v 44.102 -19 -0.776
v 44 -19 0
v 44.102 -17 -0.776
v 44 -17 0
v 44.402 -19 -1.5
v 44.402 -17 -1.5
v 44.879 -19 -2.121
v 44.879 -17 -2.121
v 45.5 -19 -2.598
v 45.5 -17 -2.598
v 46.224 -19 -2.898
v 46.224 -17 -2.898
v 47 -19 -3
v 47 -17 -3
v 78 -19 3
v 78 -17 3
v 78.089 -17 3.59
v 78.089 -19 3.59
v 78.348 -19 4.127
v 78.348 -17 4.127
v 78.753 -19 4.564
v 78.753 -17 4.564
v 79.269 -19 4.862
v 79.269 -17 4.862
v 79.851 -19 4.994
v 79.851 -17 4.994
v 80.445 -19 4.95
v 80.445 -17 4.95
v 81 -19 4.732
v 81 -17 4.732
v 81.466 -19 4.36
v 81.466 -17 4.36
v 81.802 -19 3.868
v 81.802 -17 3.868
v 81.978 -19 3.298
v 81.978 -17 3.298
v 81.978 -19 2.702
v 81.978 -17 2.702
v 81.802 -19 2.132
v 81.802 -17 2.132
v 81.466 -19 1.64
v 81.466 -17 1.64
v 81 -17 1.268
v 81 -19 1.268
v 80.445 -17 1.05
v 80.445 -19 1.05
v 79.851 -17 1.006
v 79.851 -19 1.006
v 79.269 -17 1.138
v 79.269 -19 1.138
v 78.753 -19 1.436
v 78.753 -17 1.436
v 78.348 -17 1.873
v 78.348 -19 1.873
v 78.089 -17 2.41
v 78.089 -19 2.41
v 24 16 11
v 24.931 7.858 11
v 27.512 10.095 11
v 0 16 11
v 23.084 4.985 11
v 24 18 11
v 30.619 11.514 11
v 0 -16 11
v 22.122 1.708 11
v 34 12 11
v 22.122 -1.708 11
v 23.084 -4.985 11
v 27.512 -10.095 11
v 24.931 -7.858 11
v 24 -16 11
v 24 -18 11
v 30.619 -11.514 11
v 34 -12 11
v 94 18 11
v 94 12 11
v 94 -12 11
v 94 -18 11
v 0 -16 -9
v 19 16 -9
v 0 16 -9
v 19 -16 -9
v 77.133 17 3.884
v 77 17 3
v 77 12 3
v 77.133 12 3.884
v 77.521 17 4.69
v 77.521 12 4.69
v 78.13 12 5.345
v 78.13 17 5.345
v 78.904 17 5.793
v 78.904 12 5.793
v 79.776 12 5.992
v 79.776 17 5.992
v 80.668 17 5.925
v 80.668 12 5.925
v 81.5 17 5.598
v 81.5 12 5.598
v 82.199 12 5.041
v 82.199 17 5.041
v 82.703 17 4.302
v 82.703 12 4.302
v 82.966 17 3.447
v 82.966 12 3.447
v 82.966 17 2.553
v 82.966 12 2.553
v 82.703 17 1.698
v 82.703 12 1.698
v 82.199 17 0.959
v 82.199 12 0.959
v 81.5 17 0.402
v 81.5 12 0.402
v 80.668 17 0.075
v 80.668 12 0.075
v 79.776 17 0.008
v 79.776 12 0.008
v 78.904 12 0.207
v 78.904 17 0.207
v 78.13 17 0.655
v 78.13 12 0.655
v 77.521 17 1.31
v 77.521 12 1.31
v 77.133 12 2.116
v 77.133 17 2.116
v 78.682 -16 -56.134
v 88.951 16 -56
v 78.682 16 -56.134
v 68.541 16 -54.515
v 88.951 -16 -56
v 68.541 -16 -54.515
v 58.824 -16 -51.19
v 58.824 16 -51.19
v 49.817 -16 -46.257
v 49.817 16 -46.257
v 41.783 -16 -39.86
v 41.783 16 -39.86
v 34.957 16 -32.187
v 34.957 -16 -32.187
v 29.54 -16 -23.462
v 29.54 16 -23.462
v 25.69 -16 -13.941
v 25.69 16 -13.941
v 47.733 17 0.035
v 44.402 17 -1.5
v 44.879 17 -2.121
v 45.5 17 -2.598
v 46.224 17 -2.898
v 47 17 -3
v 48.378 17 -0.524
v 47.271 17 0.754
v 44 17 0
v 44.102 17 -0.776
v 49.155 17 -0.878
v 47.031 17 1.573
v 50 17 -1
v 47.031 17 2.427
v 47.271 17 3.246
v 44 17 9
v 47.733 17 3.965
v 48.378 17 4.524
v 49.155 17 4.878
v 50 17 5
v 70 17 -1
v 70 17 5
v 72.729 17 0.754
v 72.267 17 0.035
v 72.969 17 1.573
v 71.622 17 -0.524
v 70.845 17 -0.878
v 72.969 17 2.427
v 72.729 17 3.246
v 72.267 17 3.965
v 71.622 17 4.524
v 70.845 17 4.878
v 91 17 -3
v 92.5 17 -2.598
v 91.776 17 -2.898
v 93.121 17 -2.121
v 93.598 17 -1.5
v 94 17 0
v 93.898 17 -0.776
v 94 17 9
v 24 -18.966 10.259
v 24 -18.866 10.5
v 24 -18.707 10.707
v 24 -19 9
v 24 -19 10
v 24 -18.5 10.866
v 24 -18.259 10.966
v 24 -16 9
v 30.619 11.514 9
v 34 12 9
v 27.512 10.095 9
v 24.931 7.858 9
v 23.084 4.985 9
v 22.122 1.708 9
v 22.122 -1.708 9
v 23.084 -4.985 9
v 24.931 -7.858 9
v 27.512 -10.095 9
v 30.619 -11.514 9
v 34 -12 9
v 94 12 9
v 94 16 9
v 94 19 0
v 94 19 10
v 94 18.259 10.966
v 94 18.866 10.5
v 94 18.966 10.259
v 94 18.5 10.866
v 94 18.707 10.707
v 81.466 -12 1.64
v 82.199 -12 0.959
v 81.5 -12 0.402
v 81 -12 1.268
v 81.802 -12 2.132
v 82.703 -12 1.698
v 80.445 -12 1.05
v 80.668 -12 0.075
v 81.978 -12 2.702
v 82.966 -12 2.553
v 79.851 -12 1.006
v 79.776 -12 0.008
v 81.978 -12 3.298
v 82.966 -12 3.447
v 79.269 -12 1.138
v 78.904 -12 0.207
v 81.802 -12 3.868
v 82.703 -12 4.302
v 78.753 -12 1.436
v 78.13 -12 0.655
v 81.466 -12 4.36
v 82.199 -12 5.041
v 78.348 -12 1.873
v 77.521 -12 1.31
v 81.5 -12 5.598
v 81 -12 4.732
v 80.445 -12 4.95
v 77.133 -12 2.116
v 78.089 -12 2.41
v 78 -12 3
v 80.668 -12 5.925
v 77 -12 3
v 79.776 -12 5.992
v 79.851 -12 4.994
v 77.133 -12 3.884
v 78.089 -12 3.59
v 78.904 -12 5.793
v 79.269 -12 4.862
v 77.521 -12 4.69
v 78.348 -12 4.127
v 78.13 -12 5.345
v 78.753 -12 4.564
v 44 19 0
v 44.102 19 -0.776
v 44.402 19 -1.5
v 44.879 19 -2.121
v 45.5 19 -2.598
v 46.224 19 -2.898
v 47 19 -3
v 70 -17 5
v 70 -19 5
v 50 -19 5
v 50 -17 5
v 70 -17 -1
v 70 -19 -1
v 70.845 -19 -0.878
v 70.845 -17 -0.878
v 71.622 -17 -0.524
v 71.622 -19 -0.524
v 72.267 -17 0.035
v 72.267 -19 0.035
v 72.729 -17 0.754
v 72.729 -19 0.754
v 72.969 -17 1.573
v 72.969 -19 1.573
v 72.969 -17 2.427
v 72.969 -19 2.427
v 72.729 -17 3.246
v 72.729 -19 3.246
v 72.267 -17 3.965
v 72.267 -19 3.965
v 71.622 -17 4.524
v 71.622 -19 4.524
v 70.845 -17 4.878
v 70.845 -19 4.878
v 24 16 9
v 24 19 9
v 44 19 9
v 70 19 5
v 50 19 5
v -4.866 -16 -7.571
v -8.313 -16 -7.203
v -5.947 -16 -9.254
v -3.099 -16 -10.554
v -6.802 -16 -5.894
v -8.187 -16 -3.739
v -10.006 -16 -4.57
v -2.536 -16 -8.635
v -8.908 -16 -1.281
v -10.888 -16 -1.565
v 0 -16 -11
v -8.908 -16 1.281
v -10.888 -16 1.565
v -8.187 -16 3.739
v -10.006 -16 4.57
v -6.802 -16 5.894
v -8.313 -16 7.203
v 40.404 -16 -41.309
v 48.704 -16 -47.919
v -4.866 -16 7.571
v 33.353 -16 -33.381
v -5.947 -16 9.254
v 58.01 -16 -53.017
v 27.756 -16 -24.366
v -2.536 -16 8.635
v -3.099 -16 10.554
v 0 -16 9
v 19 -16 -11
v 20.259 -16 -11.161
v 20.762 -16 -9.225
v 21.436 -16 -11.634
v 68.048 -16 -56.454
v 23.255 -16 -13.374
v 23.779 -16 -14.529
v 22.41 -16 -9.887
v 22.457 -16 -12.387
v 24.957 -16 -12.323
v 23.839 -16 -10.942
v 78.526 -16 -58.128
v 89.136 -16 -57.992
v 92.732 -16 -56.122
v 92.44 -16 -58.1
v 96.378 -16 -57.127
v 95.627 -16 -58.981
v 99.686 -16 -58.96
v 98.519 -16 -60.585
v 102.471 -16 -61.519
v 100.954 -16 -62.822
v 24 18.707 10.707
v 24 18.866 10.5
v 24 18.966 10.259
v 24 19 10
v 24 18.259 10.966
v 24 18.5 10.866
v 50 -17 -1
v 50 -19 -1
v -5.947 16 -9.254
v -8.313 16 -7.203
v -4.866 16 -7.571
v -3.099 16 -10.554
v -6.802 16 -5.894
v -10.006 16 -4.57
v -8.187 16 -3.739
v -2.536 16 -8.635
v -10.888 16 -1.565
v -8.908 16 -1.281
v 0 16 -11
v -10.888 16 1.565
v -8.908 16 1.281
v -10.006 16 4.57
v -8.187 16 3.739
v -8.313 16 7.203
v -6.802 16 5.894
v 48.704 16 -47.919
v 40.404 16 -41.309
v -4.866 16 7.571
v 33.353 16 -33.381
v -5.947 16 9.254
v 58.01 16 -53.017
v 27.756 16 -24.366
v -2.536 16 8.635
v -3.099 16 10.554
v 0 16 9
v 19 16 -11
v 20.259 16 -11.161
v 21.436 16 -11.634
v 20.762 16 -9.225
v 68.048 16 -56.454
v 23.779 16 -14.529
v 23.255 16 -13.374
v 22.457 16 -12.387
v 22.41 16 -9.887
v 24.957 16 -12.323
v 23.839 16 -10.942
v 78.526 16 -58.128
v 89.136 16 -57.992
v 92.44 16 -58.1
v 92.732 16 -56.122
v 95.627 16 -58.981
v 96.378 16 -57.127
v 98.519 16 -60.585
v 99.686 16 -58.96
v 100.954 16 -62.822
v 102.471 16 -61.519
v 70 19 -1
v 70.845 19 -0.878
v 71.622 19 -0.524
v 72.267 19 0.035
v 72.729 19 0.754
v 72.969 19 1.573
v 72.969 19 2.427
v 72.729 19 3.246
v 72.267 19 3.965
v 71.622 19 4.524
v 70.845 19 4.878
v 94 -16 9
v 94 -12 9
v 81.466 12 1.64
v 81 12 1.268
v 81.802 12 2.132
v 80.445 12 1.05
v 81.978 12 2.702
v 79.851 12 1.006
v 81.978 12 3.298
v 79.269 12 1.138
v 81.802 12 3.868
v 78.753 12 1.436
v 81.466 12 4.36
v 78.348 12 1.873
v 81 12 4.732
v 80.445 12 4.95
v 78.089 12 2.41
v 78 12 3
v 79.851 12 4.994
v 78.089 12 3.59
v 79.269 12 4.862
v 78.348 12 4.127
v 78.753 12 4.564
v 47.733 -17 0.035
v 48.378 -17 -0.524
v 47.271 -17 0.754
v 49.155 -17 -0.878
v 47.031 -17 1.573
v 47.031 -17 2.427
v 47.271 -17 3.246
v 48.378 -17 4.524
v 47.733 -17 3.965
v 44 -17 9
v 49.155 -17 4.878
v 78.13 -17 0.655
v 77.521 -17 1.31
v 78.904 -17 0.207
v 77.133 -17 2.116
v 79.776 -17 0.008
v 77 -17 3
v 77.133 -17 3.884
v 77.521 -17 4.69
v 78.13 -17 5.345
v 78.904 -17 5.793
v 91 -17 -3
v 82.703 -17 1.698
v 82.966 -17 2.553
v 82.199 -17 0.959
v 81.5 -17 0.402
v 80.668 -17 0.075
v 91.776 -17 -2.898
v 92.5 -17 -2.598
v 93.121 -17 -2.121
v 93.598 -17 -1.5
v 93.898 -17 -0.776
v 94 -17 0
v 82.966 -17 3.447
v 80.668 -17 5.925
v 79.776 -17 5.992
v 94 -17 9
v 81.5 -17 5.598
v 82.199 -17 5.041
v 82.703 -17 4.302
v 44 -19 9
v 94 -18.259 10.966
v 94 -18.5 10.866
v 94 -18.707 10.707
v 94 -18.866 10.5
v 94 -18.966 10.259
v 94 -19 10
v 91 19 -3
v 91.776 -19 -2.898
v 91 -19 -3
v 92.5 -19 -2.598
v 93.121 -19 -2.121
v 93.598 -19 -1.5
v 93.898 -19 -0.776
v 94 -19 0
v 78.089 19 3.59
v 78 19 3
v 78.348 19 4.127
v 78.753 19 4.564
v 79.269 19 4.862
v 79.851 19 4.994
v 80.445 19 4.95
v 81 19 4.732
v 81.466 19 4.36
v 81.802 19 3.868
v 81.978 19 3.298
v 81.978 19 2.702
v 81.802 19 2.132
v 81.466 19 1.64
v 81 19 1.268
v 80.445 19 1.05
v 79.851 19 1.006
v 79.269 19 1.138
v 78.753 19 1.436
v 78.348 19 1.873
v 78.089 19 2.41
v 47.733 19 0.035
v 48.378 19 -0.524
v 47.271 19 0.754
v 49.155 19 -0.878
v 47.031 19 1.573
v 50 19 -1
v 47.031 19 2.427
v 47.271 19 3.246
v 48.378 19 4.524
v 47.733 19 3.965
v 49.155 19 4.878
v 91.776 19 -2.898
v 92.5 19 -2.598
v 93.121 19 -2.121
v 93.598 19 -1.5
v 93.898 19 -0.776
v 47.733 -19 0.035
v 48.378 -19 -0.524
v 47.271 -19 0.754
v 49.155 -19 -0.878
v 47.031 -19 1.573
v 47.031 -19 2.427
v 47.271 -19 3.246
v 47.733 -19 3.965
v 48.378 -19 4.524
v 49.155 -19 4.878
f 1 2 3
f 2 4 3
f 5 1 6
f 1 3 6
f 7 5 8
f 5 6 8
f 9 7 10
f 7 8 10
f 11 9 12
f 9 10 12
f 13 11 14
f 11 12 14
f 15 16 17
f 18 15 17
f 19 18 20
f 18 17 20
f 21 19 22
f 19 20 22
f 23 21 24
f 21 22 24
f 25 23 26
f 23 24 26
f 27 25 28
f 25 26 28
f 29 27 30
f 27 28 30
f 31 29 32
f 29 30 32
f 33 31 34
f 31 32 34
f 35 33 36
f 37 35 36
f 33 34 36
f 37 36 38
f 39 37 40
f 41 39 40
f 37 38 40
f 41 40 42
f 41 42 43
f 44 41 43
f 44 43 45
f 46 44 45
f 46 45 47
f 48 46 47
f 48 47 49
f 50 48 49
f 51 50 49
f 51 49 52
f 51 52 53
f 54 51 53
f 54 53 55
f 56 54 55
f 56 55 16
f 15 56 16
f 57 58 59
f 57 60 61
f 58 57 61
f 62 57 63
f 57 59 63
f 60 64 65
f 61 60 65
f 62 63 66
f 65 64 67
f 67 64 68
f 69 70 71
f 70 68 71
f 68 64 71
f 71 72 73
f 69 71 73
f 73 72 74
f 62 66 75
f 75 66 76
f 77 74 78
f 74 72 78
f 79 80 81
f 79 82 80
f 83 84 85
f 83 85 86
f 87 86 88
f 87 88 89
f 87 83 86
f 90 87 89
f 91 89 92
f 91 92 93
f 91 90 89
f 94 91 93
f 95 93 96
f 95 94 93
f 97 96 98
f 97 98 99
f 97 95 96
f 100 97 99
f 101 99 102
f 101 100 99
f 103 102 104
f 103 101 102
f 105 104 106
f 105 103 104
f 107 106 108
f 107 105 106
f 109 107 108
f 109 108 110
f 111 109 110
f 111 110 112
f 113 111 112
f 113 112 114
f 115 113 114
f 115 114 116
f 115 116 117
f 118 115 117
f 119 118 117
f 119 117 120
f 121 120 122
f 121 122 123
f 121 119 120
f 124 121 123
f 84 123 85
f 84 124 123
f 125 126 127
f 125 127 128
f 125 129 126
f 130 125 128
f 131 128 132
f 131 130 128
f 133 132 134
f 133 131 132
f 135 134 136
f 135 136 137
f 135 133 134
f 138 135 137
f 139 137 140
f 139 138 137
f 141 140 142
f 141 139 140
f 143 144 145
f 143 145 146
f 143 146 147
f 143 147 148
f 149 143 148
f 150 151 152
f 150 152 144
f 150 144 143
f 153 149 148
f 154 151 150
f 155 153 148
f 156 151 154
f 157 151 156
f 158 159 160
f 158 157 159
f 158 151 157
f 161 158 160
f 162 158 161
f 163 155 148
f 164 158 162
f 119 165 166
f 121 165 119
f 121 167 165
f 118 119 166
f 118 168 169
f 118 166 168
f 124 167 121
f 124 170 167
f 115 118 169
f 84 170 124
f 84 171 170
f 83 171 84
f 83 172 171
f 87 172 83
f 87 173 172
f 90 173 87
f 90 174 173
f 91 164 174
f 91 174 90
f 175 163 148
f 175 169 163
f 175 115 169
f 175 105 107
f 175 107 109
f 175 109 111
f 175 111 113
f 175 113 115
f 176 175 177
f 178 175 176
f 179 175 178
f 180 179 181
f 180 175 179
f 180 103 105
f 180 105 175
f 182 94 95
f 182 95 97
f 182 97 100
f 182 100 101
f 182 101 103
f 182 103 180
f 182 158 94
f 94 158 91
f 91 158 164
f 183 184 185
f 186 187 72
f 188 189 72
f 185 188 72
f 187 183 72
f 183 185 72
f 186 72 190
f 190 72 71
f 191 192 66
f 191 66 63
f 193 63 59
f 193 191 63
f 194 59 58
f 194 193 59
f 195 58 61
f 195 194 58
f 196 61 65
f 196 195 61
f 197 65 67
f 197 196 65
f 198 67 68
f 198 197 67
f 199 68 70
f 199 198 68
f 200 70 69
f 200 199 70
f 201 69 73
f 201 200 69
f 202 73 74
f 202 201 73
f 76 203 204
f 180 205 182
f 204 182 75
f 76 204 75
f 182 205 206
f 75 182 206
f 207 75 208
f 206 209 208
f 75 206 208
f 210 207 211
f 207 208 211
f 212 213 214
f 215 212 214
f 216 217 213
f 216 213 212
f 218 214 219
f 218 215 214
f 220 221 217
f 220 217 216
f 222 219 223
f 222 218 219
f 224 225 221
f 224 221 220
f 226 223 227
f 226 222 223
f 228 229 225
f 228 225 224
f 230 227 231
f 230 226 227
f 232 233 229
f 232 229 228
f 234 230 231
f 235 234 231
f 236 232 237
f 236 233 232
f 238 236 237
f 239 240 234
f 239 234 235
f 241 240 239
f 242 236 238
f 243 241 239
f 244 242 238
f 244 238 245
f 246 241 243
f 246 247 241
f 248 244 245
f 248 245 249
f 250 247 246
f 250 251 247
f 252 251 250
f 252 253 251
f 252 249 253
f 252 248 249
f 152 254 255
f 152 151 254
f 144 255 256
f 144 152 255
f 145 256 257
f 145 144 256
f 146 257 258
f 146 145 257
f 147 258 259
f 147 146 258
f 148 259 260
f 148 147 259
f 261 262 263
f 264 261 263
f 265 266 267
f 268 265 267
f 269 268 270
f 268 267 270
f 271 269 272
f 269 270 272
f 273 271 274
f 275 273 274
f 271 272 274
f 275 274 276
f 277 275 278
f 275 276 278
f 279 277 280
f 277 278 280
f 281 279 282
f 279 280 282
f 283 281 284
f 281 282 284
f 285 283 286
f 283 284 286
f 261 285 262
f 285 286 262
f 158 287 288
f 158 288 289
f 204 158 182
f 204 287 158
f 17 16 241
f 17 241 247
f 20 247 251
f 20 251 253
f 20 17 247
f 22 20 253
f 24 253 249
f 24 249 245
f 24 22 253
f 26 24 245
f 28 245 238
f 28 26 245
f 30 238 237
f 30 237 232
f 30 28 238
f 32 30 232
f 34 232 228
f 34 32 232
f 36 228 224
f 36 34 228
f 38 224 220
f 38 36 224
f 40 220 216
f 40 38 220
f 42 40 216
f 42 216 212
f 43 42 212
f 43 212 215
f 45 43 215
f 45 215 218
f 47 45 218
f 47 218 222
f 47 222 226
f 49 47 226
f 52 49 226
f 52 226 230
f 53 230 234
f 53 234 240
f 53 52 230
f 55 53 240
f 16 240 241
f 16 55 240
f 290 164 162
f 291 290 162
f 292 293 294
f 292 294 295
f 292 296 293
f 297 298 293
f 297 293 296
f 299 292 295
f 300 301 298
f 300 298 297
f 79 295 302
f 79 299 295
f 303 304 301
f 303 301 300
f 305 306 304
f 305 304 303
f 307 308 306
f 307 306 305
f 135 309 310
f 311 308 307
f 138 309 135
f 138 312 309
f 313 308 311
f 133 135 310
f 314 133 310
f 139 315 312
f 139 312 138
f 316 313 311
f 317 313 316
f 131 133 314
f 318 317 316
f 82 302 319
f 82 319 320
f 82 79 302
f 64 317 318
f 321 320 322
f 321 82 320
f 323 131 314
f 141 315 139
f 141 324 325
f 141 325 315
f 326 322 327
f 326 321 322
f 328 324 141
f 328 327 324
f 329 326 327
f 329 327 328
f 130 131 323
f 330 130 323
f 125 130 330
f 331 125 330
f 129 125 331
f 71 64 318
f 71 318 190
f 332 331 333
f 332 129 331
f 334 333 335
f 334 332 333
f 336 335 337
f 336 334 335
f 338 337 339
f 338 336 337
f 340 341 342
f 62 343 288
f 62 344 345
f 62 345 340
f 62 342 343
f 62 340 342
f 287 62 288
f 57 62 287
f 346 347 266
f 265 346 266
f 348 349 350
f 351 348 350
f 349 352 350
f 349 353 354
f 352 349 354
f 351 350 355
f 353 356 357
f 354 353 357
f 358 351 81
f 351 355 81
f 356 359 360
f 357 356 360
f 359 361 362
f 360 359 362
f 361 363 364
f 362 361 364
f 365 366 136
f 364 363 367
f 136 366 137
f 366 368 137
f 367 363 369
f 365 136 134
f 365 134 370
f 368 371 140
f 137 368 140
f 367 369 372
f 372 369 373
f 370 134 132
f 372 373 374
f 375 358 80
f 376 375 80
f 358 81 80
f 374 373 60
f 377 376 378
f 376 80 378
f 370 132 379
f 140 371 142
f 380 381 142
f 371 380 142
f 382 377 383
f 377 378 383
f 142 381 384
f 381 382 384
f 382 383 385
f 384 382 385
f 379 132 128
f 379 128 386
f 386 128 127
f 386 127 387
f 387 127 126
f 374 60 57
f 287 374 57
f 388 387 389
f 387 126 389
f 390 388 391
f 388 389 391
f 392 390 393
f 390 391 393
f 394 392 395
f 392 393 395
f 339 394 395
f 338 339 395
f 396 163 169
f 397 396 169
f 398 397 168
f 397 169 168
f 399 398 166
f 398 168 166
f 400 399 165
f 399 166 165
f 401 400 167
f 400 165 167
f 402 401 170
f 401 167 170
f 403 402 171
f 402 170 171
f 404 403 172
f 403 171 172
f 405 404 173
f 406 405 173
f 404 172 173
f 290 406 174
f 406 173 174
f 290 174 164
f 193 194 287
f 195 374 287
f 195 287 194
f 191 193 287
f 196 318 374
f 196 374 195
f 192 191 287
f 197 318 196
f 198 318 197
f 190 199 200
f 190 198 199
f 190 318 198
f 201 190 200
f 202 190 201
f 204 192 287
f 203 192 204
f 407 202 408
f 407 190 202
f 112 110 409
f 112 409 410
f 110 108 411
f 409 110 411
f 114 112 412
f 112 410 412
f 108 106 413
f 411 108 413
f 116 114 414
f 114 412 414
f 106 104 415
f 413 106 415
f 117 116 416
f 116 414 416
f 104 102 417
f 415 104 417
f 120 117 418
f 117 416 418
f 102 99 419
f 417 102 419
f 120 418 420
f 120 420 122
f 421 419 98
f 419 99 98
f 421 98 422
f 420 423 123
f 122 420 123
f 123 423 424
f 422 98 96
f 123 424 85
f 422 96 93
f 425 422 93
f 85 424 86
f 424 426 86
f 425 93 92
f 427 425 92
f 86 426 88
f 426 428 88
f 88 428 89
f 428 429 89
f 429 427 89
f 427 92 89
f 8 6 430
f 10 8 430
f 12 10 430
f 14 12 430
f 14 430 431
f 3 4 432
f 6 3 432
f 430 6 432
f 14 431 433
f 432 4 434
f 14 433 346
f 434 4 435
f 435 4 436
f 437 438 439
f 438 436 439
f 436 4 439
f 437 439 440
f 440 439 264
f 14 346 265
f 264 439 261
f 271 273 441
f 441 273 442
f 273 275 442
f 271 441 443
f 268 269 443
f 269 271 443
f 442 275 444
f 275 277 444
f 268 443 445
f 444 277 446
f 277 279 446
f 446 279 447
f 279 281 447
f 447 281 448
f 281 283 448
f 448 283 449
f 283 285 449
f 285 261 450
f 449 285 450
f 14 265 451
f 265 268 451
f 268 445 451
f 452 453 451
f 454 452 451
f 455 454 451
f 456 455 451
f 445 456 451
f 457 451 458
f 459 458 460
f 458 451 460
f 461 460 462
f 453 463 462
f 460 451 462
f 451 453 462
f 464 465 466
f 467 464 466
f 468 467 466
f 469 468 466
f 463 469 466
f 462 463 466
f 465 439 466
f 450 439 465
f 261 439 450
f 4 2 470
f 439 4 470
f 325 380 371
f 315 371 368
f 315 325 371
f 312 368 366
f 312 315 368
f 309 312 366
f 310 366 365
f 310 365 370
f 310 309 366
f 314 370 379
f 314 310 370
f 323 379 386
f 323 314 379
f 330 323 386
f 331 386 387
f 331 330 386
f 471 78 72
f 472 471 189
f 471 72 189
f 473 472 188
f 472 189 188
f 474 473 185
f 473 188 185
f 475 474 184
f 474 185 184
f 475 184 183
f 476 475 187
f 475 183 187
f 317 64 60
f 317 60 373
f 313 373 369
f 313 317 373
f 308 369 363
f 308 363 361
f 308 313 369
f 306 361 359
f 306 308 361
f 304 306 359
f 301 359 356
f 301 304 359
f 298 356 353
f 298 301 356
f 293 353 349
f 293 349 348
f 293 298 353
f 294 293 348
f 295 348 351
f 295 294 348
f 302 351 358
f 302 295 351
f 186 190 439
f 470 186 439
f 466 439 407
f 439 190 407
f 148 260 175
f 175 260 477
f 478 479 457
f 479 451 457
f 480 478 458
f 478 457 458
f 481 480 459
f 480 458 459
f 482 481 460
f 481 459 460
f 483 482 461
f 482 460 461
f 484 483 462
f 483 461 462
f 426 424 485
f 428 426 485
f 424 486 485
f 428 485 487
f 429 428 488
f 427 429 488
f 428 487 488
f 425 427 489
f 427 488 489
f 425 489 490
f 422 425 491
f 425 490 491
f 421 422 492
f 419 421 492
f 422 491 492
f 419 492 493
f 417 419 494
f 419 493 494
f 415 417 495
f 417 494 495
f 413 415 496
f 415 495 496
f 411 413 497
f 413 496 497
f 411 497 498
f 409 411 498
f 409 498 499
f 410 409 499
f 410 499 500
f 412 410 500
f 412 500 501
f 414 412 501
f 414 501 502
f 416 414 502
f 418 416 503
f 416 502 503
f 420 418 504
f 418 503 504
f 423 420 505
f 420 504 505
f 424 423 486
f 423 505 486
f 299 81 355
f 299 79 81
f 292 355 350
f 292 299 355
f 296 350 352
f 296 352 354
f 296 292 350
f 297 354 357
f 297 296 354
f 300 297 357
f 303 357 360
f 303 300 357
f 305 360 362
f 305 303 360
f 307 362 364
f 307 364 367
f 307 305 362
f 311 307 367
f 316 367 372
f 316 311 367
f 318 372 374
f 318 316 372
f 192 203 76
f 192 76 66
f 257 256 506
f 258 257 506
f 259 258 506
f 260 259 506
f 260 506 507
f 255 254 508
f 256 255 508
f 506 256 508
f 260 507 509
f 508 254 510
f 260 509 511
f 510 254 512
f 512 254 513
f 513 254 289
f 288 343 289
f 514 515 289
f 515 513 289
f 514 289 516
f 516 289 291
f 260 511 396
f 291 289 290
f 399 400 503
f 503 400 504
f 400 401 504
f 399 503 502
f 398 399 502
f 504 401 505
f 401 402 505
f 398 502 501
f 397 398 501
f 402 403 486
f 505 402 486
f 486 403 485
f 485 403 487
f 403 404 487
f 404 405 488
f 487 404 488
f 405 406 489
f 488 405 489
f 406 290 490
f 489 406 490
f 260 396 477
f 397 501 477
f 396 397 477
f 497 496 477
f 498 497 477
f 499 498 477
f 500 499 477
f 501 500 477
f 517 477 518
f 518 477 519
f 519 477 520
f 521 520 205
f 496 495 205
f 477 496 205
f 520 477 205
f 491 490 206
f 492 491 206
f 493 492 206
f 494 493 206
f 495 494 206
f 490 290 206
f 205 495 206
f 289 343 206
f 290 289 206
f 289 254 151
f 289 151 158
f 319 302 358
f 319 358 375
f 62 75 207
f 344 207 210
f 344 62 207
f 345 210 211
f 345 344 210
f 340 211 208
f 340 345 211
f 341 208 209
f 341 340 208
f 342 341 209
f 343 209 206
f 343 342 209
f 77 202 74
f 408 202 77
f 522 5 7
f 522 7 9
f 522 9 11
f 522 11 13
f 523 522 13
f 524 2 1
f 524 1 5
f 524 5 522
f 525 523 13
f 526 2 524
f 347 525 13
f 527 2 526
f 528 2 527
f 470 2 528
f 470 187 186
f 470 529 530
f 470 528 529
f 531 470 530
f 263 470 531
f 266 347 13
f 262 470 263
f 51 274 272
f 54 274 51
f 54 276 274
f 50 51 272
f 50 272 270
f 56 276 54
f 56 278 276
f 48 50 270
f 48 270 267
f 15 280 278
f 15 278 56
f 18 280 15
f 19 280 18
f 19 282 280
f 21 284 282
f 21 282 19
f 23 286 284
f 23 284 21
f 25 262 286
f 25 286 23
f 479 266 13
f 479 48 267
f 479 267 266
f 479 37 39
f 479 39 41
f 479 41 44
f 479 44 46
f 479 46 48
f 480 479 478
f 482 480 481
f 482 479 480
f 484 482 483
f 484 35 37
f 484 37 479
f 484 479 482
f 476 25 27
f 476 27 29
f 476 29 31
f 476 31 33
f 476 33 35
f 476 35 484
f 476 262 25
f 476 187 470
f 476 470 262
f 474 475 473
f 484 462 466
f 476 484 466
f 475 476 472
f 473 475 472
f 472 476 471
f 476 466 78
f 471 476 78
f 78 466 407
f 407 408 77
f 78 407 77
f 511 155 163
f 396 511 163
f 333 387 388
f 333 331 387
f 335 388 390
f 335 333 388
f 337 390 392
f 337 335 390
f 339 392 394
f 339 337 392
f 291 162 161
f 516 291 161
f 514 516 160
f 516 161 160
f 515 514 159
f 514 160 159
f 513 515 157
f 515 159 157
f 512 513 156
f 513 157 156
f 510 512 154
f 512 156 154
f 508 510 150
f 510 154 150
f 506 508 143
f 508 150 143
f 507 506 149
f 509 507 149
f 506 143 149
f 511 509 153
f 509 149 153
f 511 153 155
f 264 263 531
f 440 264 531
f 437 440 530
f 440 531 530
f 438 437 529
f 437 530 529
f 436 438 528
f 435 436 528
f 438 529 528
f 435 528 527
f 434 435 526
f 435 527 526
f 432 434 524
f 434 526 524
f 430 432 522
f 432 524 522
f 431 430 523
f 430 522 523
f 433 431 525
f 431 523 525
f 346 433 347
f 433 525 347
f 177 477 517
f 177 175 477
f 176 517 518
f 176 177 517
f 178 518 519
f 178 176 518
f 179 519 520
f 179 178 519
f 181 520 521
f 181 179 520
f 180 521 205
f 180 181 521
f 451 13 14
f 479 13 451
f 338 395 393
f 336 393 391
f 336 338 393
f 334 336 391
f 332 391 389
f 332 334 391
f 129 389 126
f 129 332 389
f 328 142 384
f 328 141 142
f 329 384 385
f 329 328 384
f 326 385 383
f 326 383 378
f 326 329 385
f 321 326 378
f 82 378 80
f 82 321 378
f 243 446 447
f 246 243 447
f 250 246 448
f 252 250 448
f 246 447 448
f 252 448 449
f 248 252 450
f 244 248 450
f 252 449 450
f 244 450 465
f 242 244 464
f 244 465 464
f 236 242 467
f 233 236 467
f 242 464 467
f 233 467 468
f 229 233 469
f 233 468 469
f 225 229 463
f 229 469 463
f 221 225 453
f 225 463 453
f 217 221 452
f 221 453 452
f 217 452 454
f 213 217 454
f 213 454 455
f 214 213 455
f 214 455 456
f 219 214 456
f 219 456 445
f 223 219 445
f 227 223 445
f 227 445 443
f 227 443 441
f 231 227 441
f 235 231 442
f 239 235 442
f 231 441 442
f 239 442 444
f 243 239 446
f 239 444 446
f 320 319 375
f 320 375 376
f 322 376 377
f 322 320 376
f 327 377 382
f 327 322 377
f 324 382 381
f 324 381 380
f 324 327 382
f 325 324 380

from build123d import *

# Parameters (mm, degrees)
F1_DEPTH  = 16
F2_W      = 70
F2_H      = 3
F3_DEPTH  = 2
F4_W      = 50
F4_H      = 14
F5_DEPTH  = 2
F6_R      = 1
F9_DEPTH  = 32.3
F11_DEPTH = 38.001
F13_D     = 4
F14_R     = 3
F14_R_2   = 2
F15_DEPTH = 5
F16_R     = 3


# Not quite as in the source:
# - ends of sketch curves that miss each other by under 0.0002 mm in the source are joined
# - a pattern or mirror of a feature is missing from the dataset's text; its kind, count and spacing are read off the source's solid


with BuildPart() as f1:
    # F0 (on Front) → F1 (new body)
    with BuildSketch(Plane.XZ):
        with BuildLine():
            Line((94, 10.9999997337), (0, 10.9999997337))
            ThreePointArc((0, 10.9999997337), (-10.9999997337, 0), (0, -10.9999997337))
            Line((0, -10.9999997337), (19, -10.9999997337))
            ThreePointArc((19, -10.9999997337), (21.9703860558, -11.9779596195), (23.7788047483, -14.5292770618))
            ThreePointArc((23.7788047483, -14.5292770618), (48.7042113744, -47.9191442908), (89.135710582, -57.9915323328))
            ThreePointArc((89.135710582, -57.9915323328), (95.6273356348, -58.9810862831), (100.9536755577, -62.8217263174))
            Line((100.9536755577, -62.8217263174), (102.4712510554, -61.5190536469))
            ThreePointArc((102.4712510554, -61.5190536469), (96.3776978188, -57.1271725396), (88.9514269277, -56))
            ThreePointArc((88.9514269277, -56), (49.8169100213, -46.2572353593), (25.6903263931, -13.9409880714))
            ThreePointArc((25.6903263931, -13.9409880714), (23.1585403199, -10.3691437881), (19, -9))
            Line((19, -9), (0, -9))
            ThreePointArc((0, -9), (-9, 0), (0, 9))
            Line((0, 9), (94, 9))
            Line((94, 9), (94, 10.9999997337))
        make_face()
    extrude(amount=F1_DEPTH)

    # F2 (on face) → F3 (join)
    with BuildSketch(Plane.XY.offset(10.9999997337)):
        with Locations((59, -17.5)):
            Rectangle(F2_W, F2_H)
    extrude(amount=-F3_DEPTH)

    # F4 (on face) → F5 (join)
    with BuildSketch(Plane.XZ.offset(19)):
        with Locations((69, 3.9999997337)):
            Rectangle(F4_W, F4_H)
    extrude(amount=-F5_DEPTH)

    # F6
    f6_edges = [f1.edges().sort_by_distance(p)[0] for p in [
        (59, -19, 11),
    ]]
    fillet(f6_edges, radius=F6_R)

    # F7: F1 across plane


with BuildPart() as f1_1:
    add(f1.part)
    add(f1.part.mirror(Plane.XZ))

    # F8 (on Top) → F9 (cut)
    with BuildSketch(Plane.XY):
        with BuildLine():
            Line((94, 12), (34, 12))
            ThreePointArc((34, 12), (22, 0), (34, -12))
            Line((34, -12), (94, -12))
            Line((94, -12), (94, 12))
        make_face()
    extrude(amount=F9_DEPTH, mode=Mode.SUBTRACT)

    # F10 (on face) → F11 (cut, through all)
    with BuildSketch(Plane.XZ.offset(19)):
        with BuildLine():
            ThreePointArc((50, 4.9999997337), (47, 1.9999997337), (50, -1.0000002663))
            Line((50, -1.0000002663), (70, -1.0000002663))
            ThreePointArc((70, -1.0000002663), (73, 1.9999997337), (70, 4.9999997337))
            Line((70, 4.9999997337), (50, 4.9999997337))
        make_face()
    extrude(amount=-F11_DEPTH, mode=Mode.SUBTRACT)

    # F13 (through all)
    with Locations(Plane.XZ.offset(19)):
        with Locations((80, 2.9999997337)):
            Hole(F13_D / 2)

    # F14 (on face) → F15 (join)
    with BuildSketch(Plane(origin=(0, -17, 0), x_dir=(-1, 0, 0), z_dir=(0, 1, 0))):
        with Locations((-80, 2.9999997337)):
            Circle(F14_R)
        with Locations((-80, 2.9999997337)):
            Circle(F14_R_2, mode=Mode.SUBTRACT)
    f15 = extrude(amount=F15_DEPTH)

    # F15_copies: F15 across plane
    add(f15.mirror(Plane.ZX))

    # F16
    f16_edges = [f1_1.edges().sort_by_distance(p)[0] for p in [
        (94, -18, -3),
        (94, 18, -3),
        (44, -18, -3),
        (44, 18, -3),
    ]]
    fillet(f16_edges, radius=F16_R)


solid = f1_1.part
